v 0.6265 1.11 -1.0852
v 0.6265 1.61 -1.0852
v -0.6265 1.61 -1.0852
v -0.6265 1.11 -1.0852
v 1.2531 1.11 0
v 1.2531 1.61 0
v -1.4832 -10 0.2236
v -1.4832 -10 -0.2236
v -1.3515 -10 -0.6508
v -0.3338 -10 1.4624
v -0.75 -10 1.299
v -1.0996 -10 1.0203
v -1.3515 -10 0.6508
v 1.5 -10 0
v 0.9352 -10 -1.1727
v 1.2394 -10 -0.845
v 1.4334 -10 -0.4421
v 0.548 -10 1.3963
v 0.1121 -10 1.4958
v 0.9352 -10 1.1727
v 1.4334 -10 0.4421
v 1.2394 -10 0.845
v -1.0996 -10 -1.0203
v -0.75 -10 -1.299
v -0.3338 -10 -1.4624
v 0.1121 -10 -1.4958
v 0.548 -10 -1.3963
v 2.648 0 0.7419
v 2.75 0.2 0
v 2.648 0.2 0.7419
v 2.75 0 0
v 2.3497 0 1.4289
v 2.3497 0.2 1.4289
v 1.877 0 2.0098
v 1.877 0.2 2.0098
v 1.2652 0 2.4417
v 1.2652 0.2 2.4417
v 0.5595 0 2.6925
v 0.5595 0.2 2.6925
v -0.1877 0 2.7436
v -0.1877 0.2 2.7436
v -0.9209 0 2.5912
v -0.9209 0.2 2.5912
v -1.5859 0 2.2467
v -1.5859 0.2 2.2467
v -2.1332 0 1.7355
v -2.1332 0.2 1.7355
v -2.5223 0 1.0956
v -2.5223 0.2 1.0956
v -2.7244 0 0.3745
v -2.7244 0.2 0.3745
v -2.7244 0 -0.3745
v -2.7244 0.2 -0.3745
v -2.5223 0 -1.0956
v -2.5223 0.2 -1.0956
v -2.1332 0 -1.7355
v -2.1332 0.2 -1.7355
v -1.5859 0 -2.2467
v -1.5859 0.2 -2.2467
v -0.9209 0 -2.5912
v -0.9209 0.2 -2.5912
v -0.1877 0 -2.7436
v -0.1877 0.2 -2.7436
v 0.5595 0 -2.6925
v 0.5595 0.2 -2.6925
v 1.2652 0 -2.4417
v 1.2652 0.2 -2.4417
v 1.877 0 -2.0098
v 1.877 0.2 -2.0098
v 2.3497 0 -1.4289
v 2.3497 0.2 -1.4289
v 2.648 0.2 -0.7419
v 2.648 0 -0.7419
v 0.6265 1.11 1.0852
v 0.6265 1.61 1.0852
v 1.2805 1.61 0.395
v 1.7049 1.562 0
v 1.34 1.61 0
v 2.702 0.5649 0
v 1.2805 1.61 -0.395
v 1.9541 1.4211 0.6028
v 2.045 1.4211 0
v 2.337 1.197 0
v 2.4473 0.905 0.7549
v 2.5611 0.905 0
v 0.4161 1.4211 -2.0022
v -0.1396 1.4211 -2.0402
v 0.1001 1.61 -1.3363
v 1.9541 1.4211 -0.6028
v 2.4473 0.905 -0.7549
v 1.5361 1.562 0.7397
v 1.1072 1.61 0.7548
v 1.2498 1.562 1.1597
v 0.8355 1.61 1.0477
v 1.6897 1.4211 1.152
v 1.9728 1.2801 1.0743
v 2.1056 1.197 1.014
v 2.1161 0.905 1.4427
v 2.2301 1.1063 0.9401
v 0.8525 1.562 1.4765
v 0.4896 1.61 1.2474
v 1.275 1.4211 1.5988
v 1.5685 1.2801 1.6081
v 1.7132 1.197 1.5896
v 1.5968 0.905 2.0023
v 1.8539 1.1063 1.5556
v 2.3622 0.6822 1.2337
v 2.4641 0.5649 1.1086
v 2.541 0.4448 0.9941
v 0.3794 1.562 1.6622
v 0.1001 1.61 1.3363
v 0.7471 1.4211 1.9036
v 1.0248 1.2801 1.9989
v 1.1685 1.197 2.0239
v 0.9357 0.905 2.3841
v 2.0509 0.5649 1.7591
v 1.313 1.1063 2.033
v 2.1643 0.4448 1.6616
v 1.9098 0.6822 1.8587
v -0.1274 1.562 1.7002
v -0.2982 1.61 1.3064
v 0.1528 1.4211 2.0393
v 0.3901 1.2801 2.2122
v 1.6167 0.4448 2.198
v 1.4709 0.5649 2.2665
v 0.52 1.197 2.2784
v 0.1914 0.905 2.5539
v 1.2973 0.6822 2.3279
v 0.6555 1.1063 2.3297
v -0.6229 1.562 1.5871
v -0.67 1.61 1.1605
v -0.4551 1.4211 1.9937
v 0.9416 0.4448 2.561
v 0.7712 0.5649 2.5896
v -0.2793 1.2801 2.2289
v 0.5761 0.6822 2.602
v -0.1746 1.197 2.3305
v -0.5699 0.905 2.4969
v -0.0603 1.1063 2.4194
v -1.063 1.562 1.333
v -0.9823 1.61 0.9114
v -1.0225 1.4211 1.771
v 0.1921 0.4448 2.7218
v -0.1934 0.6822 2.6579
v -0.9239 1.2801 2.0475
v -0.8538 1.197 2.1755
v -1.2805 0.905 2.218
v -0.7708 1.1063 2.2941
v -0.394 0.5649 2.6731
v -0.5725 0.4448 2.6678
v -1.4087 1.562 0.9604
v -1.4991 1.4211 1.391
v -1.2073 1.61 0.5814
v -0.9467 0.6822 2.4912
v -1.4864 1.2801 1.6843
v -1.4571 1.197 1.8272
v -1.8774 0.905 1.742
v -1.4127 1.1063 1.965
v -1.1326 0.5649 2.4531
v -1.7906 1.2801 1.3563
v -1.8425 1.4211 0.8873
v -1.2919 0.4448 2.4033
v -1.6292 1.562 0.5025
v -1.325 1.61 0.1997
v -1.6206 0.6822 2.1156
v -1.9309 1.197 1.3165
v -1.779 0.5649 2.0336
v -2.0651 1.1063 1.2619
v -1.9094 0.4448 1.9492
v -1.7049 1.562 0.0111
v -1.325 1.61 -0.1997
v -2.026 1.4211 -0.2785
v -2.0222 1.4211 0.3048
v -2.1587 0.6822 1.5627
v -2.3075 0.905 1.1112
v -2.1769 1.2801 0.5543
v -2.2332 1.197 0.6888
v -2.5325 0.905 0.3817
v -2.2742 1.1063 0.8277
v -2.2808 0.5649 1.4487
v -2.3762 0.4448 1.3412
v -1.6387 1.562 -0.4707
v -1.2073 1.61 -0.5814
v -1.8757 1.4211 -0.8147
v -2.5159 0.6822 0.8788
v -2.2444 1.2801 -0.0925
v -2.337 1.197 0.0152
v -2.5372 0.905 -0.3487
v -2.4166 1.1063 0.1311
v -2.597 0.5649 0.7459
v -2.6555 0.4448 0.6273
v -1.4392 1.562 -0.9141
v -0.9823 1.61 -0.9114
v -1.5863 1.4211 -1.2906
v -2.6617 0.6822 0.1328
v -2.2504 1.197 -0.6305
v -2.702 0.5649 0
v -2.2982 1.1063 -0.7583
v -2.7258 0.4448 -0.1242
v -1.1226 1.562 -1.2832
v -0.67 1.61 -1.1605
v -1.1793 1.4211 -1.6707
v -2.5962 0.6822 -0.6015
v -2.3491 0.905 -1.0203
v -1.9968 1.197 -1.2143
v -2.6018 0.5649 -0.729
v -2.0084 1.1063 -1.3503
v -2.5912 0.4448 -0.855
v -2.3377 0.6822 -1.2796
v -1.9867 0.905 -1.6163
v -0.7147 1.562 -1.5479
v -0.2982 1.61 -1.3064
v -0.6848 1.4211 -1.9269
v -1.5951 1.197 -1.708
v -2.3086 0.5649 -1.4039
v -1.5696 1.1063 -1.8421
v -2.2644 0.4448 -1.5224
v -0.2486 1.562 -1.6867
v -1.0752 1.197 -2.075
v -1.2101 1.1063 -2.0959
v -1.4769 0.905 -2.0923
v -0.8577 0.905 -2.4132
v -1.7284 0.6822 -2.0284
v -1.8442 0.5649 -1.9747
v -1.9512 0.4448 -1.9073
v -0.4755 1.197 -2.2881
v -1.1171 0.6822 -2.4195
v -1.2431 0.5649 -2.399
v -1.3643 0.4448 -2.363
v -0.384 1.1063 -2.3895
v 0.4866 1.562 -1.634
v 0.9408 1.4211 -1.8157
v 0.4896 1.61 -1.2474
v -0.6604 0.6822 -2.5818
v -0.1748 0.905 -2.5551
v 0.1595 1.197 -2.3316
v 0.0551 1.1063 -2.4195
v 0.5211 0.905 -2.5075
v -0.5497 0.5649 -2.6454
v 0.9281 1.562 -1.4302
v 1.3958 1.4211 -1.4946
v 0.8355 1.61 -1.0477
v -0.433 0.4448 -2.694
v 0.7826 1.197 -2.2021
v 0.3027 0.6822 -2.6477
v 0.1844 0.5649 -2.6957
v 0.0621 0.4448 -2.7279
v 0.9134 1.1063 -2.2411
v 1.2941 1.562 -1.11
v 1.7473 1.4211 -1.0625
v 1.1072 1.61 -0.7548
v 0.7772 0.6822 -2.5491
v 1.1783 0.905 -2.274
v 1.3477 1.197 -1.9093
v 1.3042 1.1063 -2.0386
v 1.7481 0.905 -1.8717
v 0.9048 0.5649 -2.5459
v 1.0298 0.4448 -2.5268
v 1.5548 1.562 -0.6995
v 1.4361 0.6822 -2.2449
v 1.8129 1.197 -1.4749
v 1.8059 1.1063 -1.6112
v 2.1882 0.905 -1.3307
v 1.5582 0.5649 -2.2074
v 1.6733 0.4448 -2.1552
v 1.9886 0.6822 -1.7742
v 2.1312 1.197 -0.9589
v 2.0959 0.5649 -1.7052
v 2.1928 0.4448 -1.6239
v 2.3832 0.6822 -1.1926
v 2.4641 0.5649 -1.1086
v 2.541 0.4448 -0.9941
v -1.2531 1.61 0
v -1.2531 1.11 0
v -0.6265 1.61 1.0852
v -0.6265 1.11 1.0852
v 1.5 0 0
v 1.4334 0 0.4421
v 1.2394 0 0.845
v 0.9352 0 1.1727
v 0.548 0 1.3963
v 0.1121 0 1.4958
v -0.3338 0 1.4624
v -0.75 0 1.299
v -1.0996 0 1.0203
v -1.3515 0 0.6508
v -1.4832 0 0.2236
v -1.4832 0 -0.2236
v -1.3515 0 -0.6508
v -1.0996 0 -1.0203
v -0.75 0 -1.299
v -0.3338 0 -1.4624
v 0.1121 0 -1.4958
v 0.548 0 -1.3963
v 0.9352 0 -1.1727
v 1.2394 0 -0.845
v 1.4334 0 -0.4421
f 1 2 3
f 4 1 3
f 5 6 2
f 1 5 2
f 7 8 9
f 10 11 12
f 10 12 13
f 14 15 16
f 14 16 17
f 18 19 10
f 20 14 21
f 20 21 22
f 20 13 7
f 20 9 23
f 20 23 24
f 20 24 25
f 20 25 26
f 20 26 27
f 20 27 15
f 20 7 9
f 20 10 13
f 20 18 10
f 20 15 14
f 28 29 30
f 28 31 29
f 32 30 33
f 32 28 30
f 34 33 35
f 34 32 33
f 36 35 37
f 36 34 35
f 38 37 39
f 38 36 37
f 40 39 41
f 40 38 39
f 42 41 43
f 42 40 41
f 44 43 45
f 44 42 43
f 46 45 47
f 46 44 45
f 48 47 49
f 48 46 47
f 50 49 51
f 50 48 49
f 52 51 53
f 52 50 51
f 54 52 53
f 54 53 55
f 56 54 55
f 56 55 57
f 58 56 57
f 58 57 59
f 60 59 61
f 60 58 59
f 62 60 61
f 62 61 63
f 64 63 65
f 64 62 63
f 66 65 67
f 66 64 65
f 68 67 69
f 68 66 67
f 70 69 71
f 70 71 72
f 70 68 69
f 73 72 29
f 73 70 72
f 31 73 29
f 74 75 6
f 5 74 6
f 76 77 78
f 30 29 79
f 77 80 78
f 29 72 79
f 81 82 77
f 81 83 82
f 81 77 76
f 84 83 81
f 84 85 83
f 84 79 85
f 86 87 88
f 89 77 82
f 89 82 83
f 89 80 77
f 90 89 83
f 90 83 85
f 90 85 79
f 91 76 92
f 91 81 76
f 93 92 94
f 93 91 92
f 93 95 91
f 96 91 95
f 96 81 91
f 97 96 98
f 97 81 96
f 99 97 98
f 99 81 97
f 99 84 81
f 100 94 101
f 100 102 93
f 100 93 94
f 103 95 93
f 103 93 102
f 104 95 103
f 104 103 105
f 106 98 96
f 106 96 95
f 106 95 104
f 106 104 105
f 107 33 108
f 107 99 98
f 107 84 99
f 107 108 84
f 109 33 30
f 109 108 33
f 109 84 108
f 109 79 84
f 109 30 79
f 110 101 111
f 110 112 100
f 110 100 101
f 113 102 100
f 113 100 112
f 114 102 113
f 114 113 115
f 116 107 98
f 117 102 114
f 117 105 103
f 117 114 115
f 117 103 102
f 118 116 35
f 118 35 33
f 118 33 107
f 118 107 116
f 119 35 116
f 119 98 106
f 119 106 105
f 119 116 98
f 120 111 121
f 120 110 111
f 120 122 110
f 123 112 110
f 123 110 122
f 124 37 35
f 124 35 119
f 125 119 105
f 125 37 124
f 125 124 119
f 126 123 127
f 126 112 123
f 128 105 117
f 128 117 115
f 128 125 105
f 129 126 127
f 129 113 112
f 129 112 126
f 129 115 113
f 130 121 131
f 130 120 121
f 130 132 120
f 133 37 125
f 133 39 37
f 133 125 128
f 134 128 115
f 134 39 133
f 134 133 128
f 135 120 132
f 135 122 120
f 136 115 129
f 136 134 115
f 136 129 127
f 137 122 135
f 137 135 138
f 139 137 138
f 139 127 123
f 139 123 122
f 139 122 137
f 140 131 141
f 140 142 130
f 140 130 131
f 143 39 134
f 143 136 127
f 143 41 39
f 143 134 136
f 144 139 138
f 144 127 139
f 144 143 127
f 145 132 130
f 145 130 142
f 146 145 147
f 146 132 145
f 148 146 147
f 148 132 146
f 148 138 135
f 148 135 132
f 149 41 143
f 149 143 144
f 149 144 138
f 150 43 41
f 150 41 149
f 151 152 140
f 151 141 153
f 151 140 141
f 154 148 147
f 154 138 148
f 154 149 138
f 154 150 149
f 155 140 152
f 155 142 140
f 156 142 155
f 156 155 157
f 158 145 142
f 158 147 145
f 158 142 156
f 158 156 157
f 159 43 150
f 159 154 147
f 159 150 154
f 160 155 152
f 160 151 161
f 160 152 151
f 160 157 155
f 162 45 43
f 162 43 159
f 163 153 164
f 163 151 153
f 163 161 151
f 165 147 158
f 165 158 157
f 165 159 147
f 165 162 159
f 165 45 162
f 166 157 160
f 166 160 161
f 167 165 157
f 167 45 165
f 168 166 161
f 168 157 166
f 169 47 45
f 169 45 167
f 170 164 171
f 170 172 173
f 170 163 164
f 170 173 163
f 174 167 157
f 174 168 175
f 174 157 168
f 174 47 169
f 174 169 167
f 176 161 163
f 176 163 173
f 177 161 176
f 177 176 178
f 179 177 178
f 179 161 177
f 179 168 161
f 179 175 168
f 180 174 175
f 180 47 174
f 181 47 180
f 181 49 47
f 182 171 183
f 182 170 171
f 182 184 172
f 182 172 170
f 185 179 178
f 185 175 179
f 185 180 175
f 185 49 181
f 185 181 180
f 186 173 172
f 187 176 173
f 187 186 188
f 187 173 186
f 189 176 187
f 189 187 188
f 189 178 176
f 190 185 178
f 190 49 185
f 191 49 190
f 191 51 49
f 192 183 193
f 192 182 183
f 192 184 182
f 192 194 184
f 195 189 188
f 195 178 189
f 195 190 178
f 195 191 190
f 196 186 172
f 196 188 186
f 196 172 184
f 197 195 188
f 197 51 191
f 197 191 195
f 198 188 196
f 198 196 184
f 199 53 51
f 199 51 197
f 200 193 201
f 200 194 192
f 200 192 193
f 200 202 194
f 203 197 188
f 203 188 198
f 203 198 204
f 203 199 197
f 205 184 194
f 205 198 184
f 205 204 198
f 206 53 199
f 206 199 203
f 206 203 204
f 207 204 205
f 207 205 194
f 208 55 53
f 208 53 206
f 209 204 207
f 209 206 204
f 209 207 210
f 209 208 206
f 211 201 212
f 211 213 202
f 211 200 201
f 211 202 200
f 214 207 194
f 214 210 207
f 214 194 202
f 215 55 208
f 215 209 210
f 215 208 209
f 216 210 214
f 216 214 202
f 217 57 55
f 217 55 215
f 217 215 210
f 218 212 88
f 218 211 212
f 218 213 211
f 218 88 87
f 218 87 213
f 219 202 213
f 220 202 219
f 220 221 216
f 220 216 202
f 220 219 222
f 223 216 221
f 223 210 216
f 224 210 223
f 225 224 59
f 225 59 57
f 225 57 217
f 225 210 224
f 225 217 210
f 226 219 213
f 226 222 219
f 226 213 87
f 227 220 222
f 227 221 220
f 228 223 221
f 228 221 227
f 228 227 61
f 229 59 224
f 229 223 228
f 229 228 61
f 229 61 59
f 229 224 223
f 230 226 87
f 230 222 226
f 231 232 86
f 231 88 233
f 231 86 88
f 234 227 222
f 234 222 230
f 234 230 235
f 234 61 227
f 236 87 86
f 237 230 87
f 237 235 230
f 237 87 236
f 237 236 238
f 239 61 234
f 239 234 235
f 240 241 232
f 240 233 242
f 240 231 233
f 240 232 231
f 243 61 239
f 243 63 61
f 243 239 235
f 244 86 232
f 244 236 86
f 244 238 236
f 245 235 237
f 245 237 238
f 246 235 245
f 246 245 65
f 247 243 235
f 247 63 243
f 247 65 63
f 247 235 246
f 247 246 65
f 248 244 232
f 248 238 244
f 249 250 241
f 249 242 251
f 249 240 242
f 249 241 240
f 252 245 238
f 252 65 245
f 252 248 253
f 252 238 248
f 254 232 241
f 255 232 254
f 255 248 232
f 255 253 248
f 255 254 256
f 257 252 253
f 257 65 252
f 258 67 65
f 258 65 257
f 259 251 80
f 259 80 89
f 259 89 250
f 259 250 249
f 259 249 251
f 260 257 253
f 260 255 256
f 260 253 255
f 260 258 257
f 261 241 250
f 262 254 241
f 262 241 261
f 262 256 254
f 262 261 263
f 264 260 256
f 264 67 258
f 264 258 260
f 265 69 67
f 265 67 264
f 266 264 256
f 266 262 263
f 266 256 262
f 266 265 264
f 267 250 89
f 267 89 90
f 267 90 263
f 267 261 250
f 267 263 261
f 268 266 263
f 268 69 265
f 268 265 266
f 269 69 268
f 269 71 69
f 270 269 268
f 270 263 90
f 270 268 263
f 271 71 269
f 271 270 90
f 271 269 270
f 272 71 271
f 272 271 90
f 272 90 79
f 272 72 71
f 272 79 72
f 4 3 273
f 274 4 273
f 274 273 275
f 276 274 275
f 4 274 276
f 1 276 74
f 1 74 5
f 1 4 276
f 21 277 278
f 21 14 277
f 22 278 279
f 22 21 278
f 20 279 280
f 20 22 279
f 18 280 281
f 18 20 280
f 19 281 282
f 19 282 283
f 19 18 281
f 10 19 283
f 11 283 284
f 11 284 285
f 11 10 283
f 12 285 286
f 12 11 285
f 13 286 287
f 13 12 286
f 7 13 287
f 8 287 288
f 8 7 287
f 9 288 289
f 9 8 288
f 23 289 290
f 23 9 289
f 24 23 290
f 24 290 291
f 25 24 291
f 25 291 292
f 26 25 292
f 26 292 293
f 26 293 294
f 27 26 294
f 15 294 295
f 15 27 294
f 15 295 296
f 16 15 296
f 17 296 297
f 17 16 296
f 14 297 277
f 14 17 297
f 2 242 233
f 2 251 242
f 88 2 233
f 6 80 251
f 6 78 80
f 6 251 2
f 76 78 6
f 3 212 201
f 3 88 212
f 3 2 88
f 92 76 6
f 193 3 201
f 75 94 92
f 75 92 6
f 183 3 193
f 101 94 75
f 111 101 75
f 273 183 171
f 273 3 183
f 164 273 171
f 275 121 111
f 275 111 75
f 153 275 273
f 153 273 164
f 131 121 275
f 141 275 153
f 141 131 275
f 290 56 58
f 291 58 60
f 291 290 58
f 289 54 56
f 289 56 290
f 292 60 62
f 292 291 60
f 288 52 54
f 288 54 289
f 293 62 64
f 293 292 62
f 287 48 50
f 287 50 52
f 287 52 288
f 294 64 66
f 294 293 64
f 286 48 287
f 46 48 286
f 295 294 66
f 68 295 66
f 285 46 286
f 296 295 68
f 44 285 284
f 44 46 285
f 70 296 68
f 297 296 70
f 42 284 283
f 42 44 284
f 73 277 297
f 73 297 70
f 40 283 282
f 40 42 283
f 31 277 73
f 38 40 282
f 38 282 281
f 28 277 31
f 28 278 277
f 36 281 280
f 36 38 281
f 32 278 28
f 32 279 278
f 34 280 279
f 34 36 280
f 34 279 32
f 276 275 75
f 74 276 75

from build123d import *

# Parameters (mm, degrees)
CUT_EXTRUDE1_DEPTH = 0.5


with BuildPart() as part:
    # Sketch1 → Revolve1 (revolve)
    with BuildSketch(Plane.XY):
        with BuildLine():
            Line((0, 1.61), (1.34, 1.61))
            ThreePointArc((1.34, 1.61), (2.337020561, 1.197020561), (2.75, 0.2))
            Line((2.75, 0.2), (2.75, 0))
            Line((2.75, 0), (1.5, 0))
            Line((1.5, 0), (1.5, -10))
            Line((1.5, -10), (0, -10))
            Line((0, -10), (0, 1.61))
        make_face()
    revolve(axis=Axis((0, 9.083769969, 0), (0, -1, 0)))

    # Sketch2 → Cut-Extrude1 (cut)
    with BuildSketch(Plane(origin=(0, 1.61, 0), x_dir=(1, 0, 0), z_dir=(0, 1, 0))):
        Polygon((0.62654248, 1.085203409), (-0.62654248, 1.085203409), (-1.253084961, 0), (-0.62654248, -1.085203409), (0.62654248, -1.085203409), (1.253084961, 0), align=None)
    extrude(amount=-CUT_EXTRUDE1_DEPTH, mode=Mode.SUBTRACT)


solid = part.part
